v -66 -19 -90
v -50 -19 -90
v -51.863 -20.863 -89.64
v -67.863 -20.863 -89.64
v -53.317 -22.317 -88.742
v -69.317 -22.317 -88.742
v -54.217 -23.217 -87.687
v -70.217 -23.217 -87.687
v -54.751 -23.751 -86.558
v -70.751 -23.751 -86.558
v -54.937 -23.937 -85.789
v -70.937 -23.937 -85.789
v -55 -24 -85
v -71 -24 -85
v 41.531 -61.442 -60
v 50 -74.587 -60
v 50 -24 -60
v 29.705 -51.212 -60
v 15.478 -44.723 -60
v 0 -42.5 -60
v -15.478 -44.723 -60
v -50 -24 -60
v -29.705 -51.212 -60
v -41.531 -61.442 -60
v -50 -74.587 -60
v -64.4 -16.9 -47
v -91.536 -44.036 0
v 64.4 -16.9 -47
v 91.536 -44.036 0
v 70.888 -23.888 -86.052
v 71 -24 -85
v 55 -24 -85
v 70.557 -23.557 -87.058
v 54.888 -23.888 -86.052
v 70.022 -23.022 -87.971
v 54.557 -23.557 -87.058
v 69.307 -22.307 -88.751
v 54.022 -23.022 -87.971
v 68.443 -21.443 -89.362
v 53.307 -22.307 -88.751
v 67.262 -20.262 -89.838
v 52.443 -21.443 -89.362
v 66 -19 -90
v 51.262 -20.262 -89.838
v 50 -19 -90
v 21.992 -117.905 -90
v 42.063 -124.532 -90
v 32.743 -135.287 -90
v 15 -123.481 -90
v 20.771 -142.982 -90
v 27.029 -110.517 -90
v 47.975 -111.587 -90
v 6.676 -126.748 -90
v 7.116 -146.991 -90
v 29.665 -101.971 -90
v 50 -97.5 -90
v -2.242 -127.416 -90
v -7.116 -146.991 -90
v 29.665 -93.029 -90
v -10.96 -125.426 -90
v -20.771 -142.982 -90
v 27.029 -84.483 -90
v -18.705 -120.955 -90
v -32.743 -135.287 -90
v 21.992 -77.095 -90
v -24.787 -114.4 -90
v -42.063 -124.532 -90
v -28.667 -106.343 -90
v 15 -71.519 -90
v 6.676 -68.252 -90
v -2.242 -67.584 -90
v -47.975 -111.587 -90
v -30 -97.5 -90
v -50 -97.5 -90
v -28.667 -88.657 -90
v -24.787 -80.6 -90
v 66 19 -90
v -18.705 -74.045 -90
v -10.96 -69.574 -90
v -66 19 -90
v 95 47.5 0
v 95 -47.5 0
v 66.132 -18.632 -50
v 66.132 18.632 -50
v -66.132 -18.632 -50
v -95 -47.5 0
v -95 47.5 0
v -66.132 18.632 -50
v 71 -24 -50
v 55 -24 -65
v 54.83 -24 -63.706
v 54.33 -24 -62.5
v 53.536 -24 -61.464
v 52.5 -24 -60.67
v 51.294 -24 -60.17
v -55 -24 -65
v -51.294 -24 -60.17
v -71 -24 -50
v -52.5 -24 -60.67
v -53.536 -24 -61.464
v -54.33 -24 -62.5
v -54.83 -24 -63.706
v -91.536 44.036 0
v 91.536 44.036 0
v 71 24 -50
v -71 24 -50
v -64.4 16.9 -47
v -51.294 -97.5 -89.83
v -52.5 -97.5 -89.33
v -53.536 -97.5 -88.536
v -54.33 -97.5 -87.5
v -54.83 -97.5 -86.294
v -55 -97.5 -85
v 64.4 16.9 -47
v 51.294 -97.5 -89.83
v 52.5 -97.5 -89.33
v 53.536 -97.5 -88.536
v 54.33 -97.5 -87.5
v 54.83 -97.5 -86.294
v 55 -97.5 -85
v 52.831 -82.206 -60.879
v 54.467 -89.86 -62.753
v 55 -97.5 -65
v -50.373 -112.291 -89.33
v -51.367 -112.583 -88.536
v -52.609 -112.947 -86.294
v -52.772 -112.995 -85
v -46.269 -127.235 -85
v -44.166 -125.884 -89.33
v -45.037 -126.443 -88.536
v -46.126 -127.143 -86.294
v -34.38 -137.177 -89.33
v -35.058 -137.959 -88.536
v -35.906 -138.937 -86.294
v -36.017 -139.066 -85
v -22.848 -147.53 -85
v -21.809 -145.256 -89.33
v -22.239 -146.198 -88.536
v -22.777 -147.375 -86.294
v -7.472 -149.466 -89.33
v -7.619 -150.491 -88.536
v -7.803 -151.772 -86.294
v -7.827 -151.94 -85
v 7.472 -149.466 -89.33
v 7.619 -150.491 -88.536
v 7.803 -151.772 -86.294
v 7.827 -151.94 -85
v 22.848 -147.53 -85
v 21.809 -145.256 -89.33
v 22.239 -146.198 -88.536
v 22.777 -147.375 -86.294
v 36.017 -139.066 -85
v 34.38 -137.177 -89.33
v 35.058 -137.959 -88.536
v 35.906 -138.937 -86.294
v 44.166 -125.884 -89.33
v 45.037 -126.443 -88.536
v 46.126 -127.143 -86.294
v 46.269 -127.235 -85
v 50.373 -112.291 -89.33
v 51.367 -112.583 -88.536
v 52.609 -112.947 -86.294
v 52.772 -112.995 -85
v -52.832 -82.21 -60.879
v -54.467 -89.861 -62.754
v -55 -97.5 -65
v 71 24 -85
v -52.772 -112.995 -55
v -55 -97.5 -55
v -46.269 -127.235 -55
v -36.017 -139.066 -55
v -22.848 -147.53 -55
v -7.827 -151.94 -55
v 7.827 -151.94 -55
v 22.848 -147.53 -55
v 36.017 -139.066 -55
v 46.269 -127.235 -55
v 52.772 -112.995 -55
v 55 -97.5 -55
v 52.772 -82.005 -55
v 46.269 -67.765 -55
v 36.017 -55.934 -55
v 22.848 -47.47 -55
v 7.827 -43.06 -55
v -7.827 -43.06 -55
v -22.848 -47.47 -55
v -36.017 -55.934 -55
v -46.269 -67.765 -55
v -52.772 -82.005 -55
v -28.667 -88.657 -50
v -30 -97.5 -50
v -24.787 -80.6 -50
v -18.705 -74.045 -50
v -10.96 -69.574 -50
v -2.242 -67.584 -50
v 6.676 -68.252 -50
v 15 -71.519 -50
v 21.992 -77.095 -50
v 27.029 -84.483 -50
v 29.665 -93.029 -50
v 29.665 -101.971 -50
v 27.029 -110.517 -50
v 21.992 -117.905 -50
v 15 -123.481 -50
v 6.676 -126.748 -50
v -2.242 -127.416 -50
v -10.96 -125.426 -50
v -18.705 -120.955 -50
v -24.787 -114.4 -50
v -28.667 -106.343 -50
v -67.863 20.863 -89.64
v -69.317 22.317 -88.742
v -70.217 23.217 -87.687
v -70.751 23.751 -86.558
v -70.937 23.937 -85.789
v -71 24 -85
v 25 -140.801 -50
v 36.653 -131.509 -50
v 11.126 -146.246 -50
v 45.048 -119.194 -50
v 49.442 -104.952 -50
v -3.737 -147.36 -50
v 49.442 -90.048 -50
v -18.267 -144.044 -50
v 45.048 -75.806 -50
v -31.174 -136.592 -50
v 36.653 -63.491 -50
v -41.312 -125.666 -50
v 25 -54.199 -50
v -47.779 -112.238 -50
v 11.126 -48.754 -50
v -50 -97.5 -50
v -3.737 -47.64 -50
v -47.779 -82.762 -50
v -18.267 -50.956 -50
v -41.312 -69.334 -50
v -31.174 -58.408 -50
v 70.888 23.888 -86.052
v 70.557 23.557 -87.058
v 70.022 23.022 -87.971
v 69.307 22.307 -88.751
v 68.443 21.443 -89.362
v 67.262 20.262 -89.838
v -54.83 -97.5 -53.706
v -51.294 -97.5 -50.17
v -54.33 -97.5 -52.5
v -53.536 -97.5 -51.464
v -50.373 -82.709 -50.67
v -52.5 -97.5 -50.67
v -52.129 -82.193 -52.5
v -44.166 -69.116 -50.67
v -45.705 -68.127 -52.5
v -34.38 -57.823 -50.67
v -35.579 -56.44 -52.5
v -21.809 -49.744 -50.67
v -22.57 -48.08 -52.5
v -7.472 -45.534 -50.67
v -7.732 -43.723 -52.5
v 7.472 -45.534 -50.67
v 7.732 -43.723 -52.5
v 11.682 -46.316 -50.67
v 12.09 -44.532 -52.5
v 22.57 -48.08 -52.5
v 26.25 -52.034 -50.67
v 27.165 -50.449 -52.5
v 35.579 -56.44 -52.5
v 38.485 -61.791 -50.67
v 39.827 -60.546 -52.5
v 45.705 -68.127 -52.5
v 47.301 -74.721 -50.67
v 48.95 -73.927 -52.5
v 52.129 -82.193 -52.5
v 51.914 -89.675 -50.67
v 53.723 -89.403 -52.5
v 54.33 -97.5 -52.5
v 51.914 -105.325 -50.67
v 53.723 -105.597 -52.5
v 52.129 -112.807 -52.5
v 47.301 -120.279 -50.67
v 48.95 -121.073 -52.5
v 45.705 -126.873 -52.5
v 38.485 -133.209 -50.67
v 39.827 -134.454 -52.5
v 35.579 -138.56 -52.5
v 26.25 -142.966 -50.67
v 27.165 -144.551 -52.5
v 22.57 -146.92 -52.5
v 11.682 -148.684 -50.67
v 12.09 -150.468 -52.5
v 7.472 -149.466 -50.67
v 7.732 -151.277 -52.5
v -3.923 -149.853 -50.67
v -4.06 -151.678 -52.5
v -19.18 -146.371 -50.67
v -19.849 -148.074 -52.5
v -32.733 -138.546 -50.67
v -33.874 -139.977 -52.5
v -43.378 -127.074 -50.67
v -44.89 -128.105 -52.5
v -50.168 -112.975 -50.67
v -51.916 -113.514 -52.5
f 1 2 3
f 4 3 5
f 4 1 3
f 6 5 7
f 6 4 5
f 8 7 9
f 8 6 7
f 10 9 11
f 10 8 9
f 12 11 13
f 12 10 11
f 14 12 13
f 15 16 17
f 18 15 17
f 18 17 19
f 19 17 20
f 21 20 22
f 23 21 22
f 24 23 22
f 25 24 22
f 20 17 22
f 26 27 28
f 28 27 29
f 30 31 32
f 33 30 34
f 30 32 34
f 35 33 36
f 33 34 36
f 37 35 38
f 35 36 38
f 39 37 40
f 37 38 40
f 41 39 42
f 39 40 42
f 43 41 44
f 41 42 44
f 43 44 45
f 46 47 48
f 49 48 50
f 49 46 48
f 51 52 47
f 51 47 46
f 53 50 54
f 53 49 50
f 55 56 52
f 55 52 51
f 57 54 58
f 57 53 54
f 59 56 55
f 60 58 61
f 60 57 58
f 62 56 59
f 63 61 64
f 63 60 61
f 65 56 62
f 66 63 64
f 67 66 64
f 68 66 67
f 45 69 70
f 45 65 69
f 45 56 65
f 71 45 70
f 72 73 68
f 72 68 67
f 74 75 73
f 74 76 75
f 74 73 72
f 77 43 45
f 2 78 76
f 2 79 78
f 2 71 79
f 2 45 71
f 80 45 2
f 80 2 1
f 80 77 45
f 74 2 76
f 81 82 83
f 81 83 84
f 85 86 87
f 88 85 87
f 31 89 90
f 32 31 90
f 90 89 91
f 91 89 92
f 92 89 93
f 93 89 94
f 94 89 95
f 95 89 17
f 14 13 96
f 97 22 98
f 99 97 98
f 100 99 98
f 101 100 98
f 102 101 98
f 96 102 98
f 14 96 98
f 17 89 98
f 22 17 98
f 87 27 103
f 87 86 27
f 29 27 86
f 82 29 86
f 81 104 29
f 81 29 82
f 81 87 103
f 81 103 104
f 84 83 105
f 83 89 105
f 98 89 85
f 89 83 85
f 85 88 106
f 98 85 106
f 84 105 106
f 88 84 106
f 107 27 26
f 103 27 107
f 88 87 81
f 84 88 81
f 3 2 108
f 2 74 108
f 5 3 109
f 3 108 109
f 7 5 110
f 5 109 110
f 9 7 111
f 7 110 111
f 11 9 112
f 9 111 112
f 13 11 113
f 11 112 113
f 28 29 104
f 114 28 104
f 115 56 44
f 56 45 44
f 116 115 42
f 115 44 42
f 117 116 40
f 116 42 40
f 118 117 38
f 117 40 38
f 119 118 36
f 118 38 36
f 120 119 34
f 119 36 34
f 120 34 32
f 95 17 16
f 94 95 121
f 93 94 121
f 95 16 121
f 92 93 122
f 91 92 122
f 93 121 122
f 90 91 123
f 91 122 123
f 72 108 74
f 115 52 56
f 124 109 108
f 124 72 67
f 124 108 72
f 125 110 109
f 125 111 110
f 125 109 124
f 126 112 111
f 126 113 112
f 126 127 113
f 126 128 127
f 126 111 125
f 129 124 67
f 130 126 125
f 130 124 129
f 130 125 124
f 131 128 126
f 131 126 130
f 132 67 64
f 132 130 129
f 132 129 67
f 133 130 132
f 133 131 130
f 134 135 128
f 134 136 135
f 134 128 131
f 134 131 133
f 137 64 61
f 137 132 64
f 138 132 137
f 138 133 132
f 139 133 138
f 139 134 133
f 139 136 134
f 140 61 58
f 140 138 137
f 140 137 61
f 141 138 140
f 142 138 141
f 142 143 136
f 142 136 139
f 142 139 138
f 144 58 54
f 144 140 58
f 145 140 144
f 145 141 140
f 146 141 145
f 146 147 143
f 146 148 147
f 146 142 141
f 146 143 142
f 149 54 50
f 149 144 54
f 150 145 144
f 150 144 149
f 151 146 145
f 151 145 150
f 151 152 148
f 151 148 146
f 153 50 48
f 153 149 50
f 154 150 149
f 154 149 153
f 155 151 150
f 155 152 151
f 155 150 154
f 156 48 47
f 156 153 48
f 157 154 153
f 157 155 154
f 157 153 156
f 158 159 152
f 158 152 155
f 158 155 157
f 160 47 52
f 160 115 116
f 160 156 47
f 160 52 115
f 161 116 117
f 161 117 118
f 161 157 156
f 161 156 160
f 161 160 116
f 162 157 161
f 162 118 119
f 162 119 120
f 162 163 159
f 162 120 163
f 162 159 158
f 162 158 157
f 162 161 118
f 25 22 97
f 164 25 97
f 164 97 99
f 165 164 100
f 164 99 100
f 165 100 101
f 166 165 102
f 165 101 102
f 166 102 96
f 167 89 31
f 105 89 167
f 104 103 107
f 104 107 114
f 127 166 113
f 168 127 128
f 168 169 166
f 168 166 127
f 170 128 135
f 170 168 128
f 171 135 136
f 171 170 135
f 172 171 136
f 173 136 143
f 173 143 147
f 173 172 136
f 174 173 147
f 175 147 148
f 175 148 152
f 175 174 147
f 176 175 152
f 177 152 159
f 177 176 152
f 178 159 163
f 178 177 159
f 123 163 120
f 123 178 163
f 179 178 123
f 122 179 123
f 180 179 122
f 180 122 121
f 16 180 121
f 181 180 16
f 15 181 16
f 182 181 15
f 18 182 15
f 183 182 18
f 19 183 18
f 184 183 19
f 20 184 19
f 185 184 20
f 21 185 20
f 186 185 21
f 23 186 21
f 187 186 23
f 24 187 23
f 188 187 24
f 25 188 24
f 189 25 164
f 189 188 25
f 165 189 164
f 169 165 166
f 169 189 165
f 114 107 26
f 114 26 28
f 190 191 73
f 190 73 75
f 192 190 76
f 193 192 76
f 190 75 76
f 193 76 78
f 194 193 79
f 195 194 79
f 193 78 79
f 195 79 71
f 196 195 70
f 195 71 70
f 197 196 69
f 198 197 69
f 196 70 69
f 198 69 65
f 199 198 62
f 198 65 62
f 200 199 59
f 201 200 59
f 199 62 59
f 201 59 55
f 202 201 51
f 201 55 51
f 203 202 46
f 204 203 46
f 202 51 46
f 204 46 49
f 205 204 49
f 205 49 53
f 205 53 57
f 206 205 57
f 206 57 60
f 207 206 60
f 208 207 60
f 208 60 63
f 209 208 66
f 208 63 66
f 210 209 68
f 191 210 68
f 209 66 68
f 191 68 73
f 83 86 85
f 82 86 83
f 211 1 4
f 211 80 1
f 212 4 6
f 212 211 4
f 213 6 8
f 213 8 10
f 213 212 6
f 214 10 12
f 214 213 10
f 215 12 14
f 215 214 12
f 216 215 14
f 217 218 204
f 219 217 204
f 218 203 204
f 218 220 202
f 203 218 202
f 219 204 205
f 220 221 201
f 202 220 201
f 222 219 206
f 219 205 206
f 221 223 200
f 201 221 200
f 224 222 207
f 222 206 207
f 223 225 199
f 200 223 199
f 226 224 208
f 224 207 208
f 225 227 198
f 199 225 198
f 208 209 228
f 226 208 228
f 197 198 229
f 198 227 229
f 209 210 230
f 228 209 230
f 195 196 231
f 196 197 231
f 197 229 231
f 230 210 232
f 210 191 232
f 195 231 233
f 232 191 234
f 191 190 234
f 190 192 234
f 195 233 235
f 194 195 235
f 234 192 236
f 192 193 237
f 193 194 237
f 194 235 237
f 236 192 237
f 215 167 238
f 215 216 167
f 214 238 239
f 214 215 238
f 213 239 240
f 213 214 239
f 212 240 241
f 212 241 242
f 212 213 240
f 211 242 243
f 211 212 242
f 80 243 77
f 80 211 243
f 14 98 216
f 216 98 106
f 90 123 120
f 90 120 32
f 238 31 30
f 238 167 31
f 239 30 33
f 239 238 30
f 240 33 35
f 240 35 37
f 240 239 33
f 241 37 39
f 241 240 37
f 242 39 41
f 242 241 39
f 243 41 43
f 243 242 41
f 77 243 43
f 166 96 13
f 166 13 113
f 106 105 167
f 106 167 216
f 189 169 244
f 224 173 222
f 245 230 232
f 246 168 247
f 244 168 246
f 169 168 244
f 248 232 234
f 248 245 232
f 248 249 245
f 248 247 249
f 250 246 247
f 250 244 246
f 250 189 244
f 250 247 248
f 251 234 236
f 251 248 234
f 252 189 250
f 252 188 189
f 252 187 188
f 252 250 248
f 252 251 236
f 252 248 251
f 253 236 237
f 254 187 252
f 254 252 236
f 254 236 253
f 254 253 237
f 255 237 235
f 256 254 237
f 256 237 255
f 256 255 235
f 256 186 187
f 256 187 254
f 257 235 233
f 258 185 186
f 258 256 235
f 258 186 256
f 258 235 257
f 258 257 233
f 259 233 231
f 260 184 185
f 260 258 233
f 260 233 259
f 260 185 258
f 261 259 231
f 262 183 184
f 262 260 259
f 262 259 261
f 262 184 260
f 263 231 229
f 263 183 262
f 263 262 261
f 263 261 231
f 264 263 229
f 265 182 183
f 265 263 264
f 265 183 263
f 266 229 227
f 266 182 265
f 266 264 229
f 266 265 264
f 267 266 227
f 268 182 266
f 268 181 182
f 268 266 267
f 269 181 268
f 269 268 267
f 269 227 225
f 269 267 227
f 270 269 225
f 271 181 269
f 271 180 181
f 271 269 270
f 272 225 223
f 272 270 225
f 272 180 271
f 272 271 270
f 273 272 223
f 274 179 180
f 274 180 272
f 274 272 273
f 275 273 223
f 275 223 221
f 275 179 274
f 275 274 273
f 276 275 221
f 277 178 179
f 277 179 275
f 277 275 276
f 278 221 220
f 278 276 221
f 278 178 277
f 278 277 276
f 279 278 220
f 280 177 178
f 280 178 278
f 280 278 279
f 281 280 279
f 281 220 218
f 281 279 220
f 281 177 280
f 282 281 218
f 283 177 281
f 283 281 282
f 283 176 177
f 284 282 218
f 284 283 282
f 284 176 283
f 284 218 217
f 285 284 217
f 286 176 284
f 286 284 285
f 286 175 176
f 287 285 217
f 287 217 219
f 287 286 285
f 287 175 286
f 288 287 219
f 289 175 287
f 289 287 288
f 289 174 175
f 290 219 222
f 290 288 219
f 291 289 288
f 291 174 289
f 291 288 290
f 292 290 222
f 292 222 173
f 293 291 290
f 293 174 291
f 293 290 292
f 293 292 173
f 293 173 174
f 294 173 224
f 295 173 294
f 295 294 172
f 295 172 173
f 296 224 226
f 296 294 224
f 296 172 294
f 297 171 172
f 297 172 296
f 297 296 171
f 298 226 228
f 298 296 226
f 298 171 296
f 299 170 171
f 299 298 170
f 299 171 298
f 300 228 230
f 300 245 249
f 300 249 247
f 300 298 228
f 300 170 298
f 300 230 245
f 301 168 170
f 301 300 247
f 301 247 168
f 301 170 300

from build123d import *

# Parameters (mm, degrees)
LIGHT_PROFILE_W               = 190
LIGHT_PROFILE_H               = 95
LIGHT_EXTRUDE_DEPTH           = 50
LIGHT_EXTRUDE_DRAFT           = -30
LIGHT_SHELL_T                 = -3
ELECTRONICS_BOX_SKETCH_W      = 142
ELECTRONICS_BOX_SKETCH_H      = 48
ELECTRONICS_BOX_EXTRUDE_DEPTH = 40
SUPPORT_EXTRUDE_DEPTH         = 40
BACK_FILLET_R                 = 5
WRIST_HOLE_SKETCH_R           = 30
WRIST_HOLE_CUT_DEPTH          = 40
SUPPORT_INSET_CUT_DEPTH       = 10
FRONT_FILLET_R                = 5


with BuildPart() as part:
    # Light Profile → Light Extrude (with draft: the straight prism first)
    with BuildSketch(Plane.XY):
        Rectangle(LIGHT_PROFILE_W, LIGHT_PROFILE_H)
    extrude(amount=-LIGHT_EXTRUDE_DEPTH)
    # Light Extrude: the draft: its side faces are tilted about the plane it starts from
    light_extrude_sides = [part.faces().sort_by_distance(p)[0] for p in [
        (-95, 0, -25),
        (0, -47.5, -25),
        (95, 0, -25),
        (0, 47.5, -25),
    ]]
    draft(light_extrude_sides, Plane.XY, LIGHT_EXTRUDE_DRAFT)

    # Light Shell
    light_shell_openings = [part.faces().sort_by_distance(p)[0] for p in [
        (0, 0, 0),
    ]]
    offset(amount=LIGHT_SHELL_T, openings=light_shell_openings, kind=Kind.INTERSECTION)

    # Electronics Box Sketch → Electronics Box Extrude (add)
    with BuildSketch(Plane(origin=(0, 0, -50), x_dir=(-1, 0, 0), z_dir=(0, 0, -1))):
        Rectangle(ELECTRONICS_BOX_SKETCH_W, ELECTRONICS_BOX_SKETCH_H)
    extrude(amount=ELECTRONICS_BOX_EXTRUDE_DEPTH)

    # Support Sketch → Support Extrude (add)
    with BuildSketch(Plane.XY.offset(-50)):
        with BuildLine():
            Line((55, -97.5), (55, -24))
            Line((55, -24), (-55, -24))
            Line((-55, -24), (-55, -97.5))
            ThreePointArc((-55, -97.5), (0, -152.5), (55, -97.5))
        make_face()
    extrude(amount=-SUPPORT_EXTRUDE_DEPTH)

    # Back Fillet
    back_fillet_edges = [part.edges().sort_by_distance(p)[0] for p in [
        (-71, 0, -90),
        (0, 24, -90),
        (71, 0, -90),
        (63, -24, -90),
        (-63, -24, -90),
        (55, -60.75, -90),
        (-55, -60.75, -90),
        (0, -152.5, -90),
    ]]
    fillet(back_fillet_edges, radius=BACK_FILLET_R)

    # Wrist Hole Sketch → Wrist Hole Cut (cut)
    with BuildSketch(Plane(origin=(0, 0, -90), x_dir=(-1, 0, 0), z_dir=(0, 0, -1))):
        with Locations((0, -97.5)):
            Circle(WRIST_HOLE_SKETCH_R)
    extrude(amount=-WRIST_HOLE_CUT_DEPTH, mode=Mode.SUBTRACT)

    # Support Inset Sketch → Support Inset Cut (cut)
    with BuildSketch(Plane.XY.offset(-50)):
        with BuildLine():
            Line((-55, -24), (55, -24))
            Line((55, -24), (55, -42.5))
            Line((55, -42.5), (55, -97.5))
            ThreePointArc((55, -97.5), (0, -42.5), (-55, -97.5))
            Line((-55, -97.5), (-55, -42.5))
            Line((-55, -42.5), (-55, -24))
        make_face()
    extrude(amount=-SUPPORT_INSET_CUT_DEPTH, mode=Mode.SUBTRACT)

    # Front Fillet
    # the kernel refuses this fillet: 5 mm, written as the material it takes off along each edge
    with BuildSketch(Plane(origin=(0, -97.5, -50), x_dir=(-1, 0, 0), z_dir=(0, -1, 0))) as front_fillet_piece_1:
        with BuildLine():
            CenterArc((55 - FRONT_FILLET_R, FRONT_FILLET_R), FRONT_FILLET_R, 270, 90)
            Line((55, FRONT_FILLET_R), (55, 0))
            Line((55, 0), (55 - FRONT_FILLET_R, 0))
        make_face()
    revolve(axis=Axis((0, -97.5, -50), (0, 0, -1)), mode=Mode.SUBTRACT)
    with BuildSketch(Plane(origin=(-55, -24, -60), x_dir=(1, 0, 0), z_dir=(0, -1, 0))) as front_fillet_piece_2_section:
        with BuildLine():
            CenterArc((FRONT_FILLET_R, -FRONT_FILLET_R), FRONT_FILLET_R, 90, 90)
            Line((0, -FRONT_FILLET_R), (0, 0))
            Line((0, 0), (FRONT_FILLET_R, 0))
        make_face()
    front_fillet_piece_2 = extrude(amount=86, mode=Mode.PRIVATE)
    front_fillet_piece_2 = front_fillet_piece_2 - Plane(origin=(0, -97.5, -61.160200813), x_dir=(-1, 0, 0), z_dir=(0, 0, 1)) * Cylinder(55, 192, mode=Mode.PRIVATE)
    add(front_fillet_piece_2, mode=Mode.SUBTRACT)
    with BuildSketch(Plane(origin=(55, -110, -60), x_dir=(0, 0, -1), z_dir=(0, 1, 0))) as front_fillet_piece_3_section:
        with BuildLine():
            CenterArc((FRONT_FILLET_R, FRONT_FILLET_R), FRONT_FILLET_R, 180, 90)
            Line((0, FRONT_FILLET_R), (0, 0))
            Line((0, 0), (FRONT_FILLET_R, 0))
        make_face()
    front_fillet_piece_3 = extrude(amount=86, mode=Mode.PRIVATE)
    front_fillet_piece_3 = front_fillet_piece_3 - Plane(origin=(0, -97.5, -61.160225753), x_dir=(-1, 0, 0), z_dir=(0, 0, 1)) * Cylinder(55, 192, mode=Mode.PRIVATE)
    add(front_fillet_piece_3, mode=Mode.SUBTRACT)


solid = part.part
